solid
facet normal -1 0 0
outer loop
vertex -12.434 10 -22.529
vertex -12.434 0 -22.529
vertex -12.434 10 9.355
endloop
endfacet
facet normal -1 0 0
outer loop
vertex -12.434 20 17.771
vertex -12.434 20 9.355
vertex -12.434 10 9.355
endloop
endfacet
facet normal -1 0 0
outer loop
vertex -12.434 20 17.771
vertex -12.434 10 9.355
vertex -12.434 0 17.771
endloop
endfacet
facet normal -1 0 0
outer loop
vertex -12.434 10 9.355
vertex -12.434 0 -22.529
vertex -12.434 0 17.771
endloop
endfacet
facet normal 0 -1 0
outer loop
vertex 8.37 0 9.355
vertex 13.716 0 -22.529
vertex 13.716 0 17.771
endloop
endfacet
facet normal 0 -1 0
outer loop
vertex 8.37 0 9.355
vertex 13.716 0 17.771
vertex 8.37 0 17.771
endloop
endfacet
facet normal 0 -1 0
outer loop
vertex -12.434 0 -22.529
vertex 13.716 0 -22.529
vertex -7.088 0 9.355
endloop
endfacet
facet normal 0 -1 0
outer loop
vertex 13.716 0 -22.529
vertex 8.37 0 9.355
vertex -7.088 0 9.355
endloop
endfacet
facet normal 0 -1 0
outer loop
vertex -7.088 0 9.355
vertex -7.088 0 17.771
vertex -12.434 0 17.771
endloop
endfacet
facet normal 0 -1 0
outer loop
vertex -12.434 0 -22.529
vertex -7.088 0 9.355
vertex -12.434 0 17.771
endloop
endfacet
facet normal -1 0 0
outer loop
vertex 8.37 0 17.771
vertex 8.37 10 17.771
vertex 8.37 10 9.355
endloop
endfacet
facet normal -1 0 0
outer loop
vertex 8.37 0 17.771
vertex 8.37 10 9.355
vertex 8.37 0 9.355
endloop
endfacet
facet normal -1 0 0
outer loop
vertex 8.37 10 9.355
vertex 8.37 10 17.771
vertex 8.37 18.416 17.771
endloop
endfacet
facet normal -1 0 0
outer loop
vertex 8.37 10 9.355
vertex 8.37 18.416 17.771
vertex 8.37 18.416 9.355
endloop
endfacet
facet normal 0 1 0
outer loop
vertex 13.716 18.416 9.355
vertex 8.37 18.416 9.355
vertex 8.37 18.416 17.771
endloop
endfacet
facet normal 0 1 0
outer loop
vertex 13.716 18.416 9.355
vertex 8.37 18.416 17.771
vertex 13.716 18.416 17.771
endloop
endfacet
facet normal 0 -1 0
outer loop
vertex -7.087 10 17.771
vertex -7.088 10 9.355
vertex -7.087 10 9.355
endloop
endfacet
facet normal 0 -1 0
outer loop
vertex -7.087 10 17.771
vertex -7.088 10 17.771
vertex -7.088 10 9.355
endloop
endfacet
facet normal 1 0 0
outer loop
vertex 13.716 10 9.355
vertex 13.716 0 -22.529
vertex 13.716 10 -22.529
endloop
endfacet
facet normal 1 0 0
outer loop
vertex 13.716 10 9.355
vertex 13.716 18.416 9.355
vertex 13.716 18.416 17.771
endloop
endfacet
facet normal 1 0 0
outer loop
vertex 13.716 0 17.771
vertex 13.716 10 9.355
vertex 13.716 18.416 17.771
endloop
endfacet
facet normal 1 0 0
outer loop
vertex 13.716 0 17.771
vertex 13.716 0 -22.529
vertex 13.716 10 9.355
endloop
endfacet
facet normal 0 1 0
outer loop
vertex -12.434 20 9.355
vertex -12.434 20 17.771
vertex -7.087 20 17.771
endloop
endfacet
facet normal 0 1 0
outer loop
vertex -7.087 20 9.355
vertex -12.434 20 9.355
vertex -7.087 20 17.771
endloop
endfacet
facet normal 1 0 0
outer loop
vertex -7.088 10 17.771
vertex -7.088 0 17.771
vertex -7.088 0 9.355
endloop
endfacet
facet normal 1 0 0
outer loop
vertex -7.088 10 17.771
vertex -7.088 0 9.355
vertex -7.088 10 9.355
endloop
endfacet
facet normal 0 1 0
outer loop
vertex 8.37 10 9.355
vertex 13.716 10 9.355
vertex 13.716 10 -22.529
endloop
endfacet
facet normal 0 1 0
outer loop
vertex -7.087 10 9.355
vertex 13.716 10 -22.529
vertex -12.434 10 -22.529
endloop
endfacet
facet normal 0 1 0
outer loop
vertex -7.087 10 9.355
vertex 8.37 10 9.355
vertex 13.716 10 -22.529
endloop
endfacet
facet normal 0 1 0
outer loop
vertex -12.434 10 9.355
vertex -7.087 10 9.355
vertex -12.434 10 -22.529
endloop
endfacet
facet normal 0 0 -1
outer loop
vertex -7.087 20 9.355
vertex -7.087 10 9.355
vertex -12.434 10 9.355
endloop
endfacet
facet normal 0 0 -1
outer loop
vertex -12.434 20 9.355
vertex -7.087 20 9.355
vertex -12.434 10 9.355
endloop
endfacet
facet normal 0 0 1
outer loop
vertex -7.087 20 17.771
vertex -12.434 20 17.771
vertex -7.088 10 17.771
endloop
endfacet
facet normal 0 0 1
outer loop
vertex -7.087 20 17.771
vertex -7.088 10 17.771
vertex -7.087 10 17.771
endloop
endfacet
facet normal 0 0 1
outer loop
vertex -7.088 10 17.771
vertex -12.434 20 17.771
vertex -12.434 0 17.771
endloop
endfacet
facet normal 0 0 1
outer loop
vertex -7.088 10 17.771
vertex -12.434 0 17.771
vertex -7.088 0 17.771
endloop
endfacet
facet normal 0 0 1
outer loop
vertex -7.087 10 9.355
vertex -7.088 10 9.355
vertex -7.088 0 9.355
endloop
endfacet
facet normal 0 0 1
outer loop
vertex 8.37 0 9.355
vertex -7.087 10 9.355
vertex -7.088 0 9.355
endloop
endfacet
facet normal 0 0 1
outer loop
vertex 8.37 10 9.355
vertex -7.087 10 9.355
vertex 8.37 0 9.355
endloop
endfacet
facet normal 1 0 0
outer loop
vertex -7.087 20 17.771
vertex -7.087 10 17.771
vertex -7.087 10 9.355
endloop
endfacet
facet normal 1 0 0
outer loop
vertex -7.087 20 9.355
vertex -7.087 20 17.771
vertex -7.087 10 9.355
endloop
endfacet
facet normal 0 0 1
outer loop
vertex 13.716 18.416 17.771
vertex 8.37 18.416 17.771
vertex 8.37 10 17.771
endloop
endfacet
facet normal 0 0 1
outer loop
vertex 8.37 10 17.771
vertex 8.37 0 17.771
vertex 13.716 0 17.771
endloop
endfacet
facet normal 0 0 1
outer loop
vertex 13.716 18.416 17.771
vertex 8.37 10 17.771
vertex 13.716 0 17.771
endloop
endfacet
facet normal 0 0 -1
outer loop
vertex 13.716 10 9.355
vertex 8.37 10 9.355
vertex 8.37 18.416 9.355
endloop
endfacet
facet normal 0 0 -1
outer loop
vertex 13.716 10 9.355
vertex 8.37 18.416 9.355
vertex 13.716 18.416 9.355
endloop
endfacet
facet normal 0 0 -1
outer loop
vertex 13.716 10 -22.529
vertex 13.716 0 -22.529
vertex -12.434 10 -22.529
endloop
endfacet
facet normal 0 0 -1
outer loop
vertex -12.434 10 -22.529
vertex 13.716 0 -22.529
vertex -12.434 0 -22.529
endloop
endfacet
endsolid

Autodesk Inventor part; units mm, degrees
ref_plane "YZ Plane" through (0, 0, 0) normal (1, 0, 0) x (0, 1, 0)
ref_plane "XZ Plane" through (0, 0, 0) normal (0, 1, 0) x (-1, 0, 0)
ref_plane "XY Plane" through (0, 0, 0) normal (0, 0, 1) x (1, 0, 0)
sketch "스케치2" plane through (0, 0, 0) normal (0, 1, 0) x (-1, 0, 0)
  line L0 (12.4336, 17.7711) -> (-13.7162, 17.7711)
  line L1 (-13.7162, 17.7711) -> (-13.7162, -22.5294)
  line L2 (-13.7162, -22.5294) -> (12.4336, -22.5294)
  line L3 (12.4336, -22.5294) -> (12.4336, 17.7711)
  point P0 (0, 0)
extrude "돌출1" add sketch "스케치2" along normal blind 10
sketch "스케치3" plane through (0, 10, 0) normal (0, 1, 0) x (1, 0, 0)
  line L0 (-12.4336, 22.5294) -> (-12.4336, -17.7711) projected
  line L1 (-12.4336, -17.7711) -> (-7.0874, -17.7711)
  line L2 (-7.0874, -17.7711) -> (-7.0874, -9.3549)
  line L3 (-7.0874, -9.3549) -> (-12.4336, -9.3549)
  line L4 (-12.4336, -9.3549) -> (-12.4336, -17.7711)
  point P0 (0, 0)
extrude "돌출2" add sketch "스케치3" along normal blind 10
sketch "스케치4" plane through (0, 10, 0) normal (0, 1, 0) x (1, 0, 0)
  line L0 (-12.4336, -17.7711) -> (13.7162, -17.7711) projected
  line L1 (13.7162, -17.7711) -> (8.3702, -17.7711)
  line L2 (8.3702, -17.7711) -> (8.3702, -9.3551)
  line L3 (8.3702, -9.3551) -> (13.7162, -9.3551)
  line L4 (13.7162, -9.3551) -> (13.7162, -17.7711)
  point P0 (0, 0)
  dimension "d4" = 5.346
  dimension "d5" = 8.416
extrude "돌출3" add sketch "스케치4" along normal blind 8.416
sketch "스케치5" plane through (-12.4336, 0, 17.7711) normal (0, 0, 1) x (1, 0, 0)
  line L0 (5.3461, 10) -> (20.8038, 10) projected
  line L1 (0, 0) -> (26.1498, 0) projected
  line L2 (5.3461, 10) -> (20.8037, 10)
  line L3 (20.8037, 10) -> (20.8037, 0)
  line L4 (20.8037, 0) -> (5.3461, 0)
  line L5 (5.3461, 0) -> (5.3461, 10)
  point P0 (12.4336, 0)
  dimension "d8" = 26.1498
sketch "스케치6" plane through (0, 20, 0) normal (0, 1, 0) x (1, 0, 0)
  point P0 (0, 0)
extrude "돌출4" cut sketch "스케치5" against normal blind 8.416
equation "\"d6\" = d5"
properties part number "공부용"
